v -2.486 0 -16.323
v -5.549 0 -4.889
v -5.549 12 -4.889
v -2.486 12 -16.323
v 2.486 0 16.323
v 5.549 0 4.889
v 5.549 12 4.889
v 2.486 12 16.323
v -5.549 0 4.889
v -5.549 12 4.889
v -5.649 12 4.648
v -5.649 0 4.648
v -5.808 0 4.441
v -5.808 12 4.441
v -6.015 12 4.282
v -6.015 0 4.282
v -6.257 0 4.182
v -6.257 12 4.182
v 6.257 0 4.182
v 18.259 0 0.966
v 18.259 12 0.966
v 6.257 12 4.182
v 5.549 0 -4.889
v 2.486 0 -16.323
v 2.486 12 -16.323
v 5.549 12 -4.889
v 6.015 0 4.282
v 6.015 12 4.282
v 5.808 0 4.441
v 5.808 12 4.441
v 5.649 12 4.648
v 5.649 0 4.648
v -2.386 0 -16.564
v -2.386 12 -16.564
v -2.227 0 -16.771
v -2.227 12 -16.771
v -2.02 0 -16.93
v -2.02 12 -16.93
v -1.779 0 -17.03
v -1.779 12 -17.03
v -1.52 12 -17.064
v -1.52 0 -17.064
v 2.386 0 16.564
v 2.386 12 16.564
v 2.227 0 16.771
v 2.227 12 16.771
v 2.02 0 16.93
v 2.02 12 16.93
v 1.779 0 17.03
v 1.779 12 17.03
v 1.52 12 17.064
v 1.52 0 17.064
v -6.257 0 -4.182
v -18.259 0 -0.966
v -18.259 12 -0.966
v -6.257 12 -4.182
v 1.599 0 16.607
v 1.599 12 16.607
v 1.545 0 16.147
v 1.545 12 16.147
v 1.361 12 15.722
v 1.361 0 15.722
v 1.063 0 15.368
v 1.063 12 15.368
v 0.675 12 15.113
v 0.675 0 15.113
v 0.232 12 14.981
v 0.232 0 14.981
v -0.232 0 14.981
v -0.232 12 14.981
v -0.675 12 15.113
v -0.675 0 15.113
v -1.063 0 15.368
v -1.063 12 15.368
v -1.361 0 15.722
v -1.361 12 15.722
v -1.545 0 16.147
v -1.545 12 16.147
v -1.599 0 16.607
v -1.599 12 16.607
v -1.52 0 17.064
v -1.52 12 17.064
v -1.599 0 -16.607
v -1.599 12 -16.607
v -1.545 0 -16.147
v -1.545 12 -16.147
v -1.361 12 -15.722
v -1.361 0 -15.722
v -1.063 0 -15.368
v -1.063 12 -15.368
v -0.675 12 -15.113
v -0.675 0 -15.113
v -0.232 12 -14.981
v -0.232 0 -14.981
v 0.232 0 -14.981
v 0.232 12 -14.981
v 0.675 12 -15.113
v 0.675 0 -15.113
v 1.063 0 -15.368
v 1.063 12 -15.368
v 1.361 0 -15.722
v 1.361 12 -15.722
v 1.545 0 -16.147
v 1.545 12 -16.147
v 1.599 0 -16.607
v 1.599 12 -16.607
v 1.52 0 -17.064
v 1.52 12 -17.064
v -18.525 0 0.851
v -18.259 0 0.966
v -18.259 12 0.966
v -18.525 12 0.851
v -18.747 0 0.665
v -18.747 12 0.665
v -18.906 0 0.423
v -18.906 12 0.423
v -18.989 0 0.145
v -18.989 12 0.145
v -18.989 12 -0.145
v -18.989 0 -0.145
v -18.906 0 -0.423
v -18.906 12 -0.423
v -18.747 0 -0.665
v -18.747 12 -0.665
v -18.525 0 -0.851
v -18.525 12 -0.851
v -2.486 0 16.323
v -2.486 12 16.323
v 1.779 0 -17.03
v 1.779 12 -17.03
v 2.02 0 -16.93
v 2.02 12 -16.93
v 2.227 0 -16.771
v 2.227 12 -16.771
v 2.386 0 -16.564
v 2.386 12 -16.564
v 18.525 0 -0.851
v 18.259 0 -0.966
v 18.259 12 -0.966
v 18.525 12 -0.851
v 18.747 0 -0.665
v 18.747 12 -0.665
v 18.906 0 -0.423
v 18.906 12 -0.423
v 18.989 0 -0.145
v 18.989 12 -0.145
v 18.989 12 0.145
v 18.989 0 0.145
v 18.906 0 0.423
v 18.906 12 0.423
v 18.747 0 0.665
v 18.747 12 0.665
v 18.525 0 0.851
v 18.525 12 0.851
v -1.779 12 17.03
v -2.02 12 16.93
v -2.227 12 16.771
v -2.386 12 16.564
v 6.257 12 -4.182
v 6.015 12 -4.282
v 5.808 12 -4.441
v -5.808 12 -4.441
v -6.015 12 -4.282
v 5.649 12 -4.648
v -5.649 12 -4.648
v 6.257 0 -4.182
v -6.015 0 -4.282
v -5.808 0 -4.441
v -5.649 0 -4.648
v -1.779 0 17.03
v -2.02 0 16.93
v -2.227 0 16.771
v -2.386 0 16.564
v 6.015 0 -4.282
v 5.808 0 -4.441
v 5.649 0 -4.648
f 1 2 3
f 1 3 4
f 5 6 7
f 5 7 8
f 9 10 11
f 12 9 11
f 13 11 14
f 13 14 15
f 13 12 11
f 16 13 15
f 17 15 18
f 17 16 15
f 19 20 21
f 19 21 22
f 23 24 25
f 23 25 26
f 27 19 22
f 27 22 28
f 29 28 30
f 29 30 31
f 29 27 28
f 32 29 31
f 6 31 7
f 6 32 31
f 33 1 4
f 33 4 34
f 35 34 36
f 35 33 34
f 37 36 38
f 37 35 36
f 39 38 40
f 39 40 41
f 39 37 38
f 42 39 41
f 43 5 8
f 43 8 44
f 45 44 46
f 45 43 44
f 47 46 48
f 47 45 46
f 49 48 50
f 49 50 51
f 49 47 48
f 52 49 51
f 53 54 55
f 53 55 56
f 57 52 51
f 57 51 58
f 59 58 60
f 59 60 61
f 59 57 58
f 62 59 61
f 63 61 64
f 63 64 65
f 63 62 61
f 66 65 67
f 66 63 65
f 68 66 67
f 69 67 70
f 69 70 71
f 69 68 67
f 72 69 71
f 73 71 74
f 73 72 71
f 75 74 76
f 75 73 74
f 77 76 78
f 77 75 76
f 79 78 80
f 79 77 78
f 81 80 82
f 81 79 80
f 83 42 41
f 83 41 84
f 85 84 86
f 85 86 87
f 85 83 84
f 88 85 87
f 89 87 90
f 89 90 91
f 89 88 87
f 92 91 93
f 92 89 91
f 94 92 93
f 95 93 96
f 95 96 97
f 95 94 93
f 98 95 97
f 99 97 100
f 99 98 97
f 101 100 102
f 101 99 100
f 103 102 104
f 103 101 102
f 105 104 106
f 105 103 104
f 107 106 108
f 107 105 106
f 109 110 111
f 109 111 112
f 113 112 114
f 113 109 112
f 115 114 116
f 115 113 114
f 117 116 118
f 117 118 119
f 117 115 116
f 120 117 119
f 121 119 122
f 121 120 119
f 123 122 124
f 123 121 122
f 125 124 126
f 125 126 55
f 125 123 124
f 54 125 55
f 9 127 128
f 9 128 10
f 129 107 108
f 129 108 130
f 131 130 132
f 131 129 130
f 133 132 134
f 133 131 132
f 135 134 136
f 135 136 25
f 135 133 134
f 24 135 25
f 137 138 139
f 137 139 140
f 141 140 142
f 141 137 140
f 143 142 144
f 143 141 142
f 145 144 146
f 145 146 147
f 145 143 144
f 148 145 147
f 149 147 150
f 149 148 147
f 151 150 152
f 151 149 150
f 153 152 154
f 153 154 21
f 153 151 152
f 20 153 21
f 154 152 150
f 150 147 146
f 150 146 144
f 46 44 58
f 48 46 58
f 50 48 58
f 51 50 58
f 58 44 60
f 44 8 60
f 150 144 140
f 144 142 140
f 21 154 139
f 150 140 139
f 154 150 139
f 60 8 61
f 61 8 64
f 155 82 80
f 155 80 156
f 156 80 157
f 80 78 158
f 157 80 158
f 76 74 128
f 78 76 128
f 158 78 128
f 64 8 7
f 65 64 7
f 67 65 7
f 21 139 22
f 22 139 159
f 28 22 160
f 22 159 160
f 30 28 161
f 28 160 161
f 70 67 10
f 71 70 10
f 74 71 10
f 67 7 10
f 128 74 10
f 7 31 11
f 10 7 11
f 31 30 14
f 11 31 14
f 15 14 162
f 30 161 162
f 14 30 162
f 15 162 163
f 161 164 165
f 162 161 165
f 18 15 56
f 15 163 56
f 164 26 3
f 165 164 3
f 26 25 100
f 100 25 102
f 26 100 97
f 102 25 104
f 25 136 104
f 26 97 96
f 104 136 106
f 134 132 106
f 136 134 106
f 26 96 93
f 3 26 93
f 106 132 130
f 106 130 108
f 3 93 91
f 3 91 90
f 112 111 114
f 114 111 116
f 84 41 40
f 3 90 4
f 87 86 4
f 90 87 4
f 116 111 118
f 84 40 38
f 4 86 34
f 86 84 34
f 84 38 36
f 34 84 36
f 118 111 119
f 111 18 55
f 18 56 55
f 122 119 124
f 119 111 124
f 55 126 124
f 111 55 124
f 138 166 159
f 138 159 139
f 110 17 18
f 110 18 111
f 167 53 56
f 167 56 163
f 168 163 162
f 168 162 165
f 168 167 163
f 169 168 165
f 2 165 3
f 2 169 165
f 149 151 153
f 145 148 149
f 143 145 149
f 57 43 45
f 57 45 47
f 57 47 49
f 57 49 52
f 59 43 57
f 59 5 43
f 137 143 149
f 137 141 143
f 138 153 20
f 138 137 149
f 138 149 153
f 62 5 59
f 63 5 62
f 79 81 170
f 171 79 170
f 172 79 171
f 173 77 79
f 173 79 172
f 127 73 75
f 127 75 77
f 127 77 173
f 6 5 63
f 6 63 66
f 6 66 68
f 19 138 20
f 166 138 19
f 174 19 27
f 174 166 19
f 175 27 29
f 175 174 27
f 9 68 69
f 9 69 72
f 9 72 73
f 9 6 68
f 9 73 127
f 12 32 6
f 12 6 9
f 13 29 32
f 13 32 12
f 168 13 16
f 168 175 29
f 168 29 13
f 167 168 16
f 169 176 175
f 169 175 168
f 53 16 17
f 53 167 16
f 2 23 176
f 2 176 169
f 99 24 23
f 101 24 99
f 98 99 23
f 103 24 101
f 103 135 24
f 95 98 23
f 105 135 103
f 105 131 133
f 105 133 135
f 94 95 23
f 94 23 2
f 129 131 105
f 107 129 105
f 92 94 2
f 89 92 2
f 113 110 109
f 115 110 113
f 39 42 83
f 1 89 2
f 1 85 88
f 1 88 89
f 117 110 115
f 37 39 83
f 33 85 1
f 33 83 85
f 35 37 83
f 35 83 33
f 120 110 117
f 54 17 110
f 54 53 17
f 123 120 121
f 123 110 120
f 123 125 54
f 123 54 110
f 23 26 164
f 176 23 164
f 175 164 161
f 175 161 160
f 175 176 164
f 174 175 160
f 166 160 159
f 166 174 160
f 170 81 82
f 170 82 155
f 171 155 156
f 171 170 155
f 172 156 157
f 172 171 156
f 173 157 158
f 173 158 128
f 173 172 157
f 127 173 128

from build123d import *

# Parameters (mm, degrees)
BOSS_EXTRU_1_DEPTH = 12


with BuildPart() as part:
    # Esquisse1 → Boss.-Extru.1 (new body)
    with BuildSketch(Plane(origin=(0, 0, 0), x_dir=(1, 0, 0), z_dir=(0, 1, 0))):
        with BuildLine():
            Line((2.485794242, 16.322649508), (5.549421558, 4.88903671))
            ThreePointArc((5.549421558, 4.88903671), (5.808240603, 4.440748973), (6.256528339, 4.181929928))
            Line((6.256528339, 4.181929928), (18.258819045, 0.965925826))
            ThreePointArc((18.258819045, 0.965925826), (19, 0), (18.258819045, -0.965925826))
            Line((18.258819045, -0.965925826), (6.256528339, -4.181929928))
            ThreePointArc((6.256528339, -4.181929928), (5.808240603, -4.440748973), (5.549421558, -4.88903671))
            Line((5.549421558, -4.88903671), (2.485794242, -16.322649508))
            ThreePointArc((2.485794242, -16.322649508), (2.128629844, -16.857183803), (1.519868415, -17.063830463))
            ThreePointArc((1.519868415, -17.063830463), (0, -14.963830463), (-1.519868415, -17.063830463))
            ThreePointArc((-1.519868415, -17.063830463), (-2.128629844, -16.857183803), (-2.485794242, -16.322649508))
            Line((-2.485794242, -16.322649508), (-5.549421558, -4.88903671))
            ThreePointArc((-5.549421558, -4.88903671), (-5.808240603, -4.440748973), (-6.256528339, -4.181929928))
            Line((-6.256528339, -4.181929928), (-18.258819045, -0.965925826))
            ThreePointArc((-18.258819045, -0.965925826), (-19, 0), (-18.258819045, 0.965925826))
            Line((-18.258819045, 0.965925826), (-6.256528339, 4.181929928))
            ThreePointArc((-6.256528339, 4.181929928), (-5.808240603, 4.440748973), (-5.549421558, 4.88903671))
            Line((-5.549421558, 4.88903671), (-2.485794242, 16.322649508))
            ThreePointArc((-2.485794242, 16.322649508), (-2.128629844, 16.857183803), (-1.519868415, 17.063830463))
            ThreePointArc((-1.519868415, 17.063830463), (0, 14.963830463), (1.519868415, 17.063830463))
            ThreePointArc((1.519868415, 17.063830463), (2.128629844, 16.857183803), (2.485794242, 16.322649508))
        make_face()
    extrude(amount=BOSS_EXTRU_1_DEPTH)


solid = part.part
